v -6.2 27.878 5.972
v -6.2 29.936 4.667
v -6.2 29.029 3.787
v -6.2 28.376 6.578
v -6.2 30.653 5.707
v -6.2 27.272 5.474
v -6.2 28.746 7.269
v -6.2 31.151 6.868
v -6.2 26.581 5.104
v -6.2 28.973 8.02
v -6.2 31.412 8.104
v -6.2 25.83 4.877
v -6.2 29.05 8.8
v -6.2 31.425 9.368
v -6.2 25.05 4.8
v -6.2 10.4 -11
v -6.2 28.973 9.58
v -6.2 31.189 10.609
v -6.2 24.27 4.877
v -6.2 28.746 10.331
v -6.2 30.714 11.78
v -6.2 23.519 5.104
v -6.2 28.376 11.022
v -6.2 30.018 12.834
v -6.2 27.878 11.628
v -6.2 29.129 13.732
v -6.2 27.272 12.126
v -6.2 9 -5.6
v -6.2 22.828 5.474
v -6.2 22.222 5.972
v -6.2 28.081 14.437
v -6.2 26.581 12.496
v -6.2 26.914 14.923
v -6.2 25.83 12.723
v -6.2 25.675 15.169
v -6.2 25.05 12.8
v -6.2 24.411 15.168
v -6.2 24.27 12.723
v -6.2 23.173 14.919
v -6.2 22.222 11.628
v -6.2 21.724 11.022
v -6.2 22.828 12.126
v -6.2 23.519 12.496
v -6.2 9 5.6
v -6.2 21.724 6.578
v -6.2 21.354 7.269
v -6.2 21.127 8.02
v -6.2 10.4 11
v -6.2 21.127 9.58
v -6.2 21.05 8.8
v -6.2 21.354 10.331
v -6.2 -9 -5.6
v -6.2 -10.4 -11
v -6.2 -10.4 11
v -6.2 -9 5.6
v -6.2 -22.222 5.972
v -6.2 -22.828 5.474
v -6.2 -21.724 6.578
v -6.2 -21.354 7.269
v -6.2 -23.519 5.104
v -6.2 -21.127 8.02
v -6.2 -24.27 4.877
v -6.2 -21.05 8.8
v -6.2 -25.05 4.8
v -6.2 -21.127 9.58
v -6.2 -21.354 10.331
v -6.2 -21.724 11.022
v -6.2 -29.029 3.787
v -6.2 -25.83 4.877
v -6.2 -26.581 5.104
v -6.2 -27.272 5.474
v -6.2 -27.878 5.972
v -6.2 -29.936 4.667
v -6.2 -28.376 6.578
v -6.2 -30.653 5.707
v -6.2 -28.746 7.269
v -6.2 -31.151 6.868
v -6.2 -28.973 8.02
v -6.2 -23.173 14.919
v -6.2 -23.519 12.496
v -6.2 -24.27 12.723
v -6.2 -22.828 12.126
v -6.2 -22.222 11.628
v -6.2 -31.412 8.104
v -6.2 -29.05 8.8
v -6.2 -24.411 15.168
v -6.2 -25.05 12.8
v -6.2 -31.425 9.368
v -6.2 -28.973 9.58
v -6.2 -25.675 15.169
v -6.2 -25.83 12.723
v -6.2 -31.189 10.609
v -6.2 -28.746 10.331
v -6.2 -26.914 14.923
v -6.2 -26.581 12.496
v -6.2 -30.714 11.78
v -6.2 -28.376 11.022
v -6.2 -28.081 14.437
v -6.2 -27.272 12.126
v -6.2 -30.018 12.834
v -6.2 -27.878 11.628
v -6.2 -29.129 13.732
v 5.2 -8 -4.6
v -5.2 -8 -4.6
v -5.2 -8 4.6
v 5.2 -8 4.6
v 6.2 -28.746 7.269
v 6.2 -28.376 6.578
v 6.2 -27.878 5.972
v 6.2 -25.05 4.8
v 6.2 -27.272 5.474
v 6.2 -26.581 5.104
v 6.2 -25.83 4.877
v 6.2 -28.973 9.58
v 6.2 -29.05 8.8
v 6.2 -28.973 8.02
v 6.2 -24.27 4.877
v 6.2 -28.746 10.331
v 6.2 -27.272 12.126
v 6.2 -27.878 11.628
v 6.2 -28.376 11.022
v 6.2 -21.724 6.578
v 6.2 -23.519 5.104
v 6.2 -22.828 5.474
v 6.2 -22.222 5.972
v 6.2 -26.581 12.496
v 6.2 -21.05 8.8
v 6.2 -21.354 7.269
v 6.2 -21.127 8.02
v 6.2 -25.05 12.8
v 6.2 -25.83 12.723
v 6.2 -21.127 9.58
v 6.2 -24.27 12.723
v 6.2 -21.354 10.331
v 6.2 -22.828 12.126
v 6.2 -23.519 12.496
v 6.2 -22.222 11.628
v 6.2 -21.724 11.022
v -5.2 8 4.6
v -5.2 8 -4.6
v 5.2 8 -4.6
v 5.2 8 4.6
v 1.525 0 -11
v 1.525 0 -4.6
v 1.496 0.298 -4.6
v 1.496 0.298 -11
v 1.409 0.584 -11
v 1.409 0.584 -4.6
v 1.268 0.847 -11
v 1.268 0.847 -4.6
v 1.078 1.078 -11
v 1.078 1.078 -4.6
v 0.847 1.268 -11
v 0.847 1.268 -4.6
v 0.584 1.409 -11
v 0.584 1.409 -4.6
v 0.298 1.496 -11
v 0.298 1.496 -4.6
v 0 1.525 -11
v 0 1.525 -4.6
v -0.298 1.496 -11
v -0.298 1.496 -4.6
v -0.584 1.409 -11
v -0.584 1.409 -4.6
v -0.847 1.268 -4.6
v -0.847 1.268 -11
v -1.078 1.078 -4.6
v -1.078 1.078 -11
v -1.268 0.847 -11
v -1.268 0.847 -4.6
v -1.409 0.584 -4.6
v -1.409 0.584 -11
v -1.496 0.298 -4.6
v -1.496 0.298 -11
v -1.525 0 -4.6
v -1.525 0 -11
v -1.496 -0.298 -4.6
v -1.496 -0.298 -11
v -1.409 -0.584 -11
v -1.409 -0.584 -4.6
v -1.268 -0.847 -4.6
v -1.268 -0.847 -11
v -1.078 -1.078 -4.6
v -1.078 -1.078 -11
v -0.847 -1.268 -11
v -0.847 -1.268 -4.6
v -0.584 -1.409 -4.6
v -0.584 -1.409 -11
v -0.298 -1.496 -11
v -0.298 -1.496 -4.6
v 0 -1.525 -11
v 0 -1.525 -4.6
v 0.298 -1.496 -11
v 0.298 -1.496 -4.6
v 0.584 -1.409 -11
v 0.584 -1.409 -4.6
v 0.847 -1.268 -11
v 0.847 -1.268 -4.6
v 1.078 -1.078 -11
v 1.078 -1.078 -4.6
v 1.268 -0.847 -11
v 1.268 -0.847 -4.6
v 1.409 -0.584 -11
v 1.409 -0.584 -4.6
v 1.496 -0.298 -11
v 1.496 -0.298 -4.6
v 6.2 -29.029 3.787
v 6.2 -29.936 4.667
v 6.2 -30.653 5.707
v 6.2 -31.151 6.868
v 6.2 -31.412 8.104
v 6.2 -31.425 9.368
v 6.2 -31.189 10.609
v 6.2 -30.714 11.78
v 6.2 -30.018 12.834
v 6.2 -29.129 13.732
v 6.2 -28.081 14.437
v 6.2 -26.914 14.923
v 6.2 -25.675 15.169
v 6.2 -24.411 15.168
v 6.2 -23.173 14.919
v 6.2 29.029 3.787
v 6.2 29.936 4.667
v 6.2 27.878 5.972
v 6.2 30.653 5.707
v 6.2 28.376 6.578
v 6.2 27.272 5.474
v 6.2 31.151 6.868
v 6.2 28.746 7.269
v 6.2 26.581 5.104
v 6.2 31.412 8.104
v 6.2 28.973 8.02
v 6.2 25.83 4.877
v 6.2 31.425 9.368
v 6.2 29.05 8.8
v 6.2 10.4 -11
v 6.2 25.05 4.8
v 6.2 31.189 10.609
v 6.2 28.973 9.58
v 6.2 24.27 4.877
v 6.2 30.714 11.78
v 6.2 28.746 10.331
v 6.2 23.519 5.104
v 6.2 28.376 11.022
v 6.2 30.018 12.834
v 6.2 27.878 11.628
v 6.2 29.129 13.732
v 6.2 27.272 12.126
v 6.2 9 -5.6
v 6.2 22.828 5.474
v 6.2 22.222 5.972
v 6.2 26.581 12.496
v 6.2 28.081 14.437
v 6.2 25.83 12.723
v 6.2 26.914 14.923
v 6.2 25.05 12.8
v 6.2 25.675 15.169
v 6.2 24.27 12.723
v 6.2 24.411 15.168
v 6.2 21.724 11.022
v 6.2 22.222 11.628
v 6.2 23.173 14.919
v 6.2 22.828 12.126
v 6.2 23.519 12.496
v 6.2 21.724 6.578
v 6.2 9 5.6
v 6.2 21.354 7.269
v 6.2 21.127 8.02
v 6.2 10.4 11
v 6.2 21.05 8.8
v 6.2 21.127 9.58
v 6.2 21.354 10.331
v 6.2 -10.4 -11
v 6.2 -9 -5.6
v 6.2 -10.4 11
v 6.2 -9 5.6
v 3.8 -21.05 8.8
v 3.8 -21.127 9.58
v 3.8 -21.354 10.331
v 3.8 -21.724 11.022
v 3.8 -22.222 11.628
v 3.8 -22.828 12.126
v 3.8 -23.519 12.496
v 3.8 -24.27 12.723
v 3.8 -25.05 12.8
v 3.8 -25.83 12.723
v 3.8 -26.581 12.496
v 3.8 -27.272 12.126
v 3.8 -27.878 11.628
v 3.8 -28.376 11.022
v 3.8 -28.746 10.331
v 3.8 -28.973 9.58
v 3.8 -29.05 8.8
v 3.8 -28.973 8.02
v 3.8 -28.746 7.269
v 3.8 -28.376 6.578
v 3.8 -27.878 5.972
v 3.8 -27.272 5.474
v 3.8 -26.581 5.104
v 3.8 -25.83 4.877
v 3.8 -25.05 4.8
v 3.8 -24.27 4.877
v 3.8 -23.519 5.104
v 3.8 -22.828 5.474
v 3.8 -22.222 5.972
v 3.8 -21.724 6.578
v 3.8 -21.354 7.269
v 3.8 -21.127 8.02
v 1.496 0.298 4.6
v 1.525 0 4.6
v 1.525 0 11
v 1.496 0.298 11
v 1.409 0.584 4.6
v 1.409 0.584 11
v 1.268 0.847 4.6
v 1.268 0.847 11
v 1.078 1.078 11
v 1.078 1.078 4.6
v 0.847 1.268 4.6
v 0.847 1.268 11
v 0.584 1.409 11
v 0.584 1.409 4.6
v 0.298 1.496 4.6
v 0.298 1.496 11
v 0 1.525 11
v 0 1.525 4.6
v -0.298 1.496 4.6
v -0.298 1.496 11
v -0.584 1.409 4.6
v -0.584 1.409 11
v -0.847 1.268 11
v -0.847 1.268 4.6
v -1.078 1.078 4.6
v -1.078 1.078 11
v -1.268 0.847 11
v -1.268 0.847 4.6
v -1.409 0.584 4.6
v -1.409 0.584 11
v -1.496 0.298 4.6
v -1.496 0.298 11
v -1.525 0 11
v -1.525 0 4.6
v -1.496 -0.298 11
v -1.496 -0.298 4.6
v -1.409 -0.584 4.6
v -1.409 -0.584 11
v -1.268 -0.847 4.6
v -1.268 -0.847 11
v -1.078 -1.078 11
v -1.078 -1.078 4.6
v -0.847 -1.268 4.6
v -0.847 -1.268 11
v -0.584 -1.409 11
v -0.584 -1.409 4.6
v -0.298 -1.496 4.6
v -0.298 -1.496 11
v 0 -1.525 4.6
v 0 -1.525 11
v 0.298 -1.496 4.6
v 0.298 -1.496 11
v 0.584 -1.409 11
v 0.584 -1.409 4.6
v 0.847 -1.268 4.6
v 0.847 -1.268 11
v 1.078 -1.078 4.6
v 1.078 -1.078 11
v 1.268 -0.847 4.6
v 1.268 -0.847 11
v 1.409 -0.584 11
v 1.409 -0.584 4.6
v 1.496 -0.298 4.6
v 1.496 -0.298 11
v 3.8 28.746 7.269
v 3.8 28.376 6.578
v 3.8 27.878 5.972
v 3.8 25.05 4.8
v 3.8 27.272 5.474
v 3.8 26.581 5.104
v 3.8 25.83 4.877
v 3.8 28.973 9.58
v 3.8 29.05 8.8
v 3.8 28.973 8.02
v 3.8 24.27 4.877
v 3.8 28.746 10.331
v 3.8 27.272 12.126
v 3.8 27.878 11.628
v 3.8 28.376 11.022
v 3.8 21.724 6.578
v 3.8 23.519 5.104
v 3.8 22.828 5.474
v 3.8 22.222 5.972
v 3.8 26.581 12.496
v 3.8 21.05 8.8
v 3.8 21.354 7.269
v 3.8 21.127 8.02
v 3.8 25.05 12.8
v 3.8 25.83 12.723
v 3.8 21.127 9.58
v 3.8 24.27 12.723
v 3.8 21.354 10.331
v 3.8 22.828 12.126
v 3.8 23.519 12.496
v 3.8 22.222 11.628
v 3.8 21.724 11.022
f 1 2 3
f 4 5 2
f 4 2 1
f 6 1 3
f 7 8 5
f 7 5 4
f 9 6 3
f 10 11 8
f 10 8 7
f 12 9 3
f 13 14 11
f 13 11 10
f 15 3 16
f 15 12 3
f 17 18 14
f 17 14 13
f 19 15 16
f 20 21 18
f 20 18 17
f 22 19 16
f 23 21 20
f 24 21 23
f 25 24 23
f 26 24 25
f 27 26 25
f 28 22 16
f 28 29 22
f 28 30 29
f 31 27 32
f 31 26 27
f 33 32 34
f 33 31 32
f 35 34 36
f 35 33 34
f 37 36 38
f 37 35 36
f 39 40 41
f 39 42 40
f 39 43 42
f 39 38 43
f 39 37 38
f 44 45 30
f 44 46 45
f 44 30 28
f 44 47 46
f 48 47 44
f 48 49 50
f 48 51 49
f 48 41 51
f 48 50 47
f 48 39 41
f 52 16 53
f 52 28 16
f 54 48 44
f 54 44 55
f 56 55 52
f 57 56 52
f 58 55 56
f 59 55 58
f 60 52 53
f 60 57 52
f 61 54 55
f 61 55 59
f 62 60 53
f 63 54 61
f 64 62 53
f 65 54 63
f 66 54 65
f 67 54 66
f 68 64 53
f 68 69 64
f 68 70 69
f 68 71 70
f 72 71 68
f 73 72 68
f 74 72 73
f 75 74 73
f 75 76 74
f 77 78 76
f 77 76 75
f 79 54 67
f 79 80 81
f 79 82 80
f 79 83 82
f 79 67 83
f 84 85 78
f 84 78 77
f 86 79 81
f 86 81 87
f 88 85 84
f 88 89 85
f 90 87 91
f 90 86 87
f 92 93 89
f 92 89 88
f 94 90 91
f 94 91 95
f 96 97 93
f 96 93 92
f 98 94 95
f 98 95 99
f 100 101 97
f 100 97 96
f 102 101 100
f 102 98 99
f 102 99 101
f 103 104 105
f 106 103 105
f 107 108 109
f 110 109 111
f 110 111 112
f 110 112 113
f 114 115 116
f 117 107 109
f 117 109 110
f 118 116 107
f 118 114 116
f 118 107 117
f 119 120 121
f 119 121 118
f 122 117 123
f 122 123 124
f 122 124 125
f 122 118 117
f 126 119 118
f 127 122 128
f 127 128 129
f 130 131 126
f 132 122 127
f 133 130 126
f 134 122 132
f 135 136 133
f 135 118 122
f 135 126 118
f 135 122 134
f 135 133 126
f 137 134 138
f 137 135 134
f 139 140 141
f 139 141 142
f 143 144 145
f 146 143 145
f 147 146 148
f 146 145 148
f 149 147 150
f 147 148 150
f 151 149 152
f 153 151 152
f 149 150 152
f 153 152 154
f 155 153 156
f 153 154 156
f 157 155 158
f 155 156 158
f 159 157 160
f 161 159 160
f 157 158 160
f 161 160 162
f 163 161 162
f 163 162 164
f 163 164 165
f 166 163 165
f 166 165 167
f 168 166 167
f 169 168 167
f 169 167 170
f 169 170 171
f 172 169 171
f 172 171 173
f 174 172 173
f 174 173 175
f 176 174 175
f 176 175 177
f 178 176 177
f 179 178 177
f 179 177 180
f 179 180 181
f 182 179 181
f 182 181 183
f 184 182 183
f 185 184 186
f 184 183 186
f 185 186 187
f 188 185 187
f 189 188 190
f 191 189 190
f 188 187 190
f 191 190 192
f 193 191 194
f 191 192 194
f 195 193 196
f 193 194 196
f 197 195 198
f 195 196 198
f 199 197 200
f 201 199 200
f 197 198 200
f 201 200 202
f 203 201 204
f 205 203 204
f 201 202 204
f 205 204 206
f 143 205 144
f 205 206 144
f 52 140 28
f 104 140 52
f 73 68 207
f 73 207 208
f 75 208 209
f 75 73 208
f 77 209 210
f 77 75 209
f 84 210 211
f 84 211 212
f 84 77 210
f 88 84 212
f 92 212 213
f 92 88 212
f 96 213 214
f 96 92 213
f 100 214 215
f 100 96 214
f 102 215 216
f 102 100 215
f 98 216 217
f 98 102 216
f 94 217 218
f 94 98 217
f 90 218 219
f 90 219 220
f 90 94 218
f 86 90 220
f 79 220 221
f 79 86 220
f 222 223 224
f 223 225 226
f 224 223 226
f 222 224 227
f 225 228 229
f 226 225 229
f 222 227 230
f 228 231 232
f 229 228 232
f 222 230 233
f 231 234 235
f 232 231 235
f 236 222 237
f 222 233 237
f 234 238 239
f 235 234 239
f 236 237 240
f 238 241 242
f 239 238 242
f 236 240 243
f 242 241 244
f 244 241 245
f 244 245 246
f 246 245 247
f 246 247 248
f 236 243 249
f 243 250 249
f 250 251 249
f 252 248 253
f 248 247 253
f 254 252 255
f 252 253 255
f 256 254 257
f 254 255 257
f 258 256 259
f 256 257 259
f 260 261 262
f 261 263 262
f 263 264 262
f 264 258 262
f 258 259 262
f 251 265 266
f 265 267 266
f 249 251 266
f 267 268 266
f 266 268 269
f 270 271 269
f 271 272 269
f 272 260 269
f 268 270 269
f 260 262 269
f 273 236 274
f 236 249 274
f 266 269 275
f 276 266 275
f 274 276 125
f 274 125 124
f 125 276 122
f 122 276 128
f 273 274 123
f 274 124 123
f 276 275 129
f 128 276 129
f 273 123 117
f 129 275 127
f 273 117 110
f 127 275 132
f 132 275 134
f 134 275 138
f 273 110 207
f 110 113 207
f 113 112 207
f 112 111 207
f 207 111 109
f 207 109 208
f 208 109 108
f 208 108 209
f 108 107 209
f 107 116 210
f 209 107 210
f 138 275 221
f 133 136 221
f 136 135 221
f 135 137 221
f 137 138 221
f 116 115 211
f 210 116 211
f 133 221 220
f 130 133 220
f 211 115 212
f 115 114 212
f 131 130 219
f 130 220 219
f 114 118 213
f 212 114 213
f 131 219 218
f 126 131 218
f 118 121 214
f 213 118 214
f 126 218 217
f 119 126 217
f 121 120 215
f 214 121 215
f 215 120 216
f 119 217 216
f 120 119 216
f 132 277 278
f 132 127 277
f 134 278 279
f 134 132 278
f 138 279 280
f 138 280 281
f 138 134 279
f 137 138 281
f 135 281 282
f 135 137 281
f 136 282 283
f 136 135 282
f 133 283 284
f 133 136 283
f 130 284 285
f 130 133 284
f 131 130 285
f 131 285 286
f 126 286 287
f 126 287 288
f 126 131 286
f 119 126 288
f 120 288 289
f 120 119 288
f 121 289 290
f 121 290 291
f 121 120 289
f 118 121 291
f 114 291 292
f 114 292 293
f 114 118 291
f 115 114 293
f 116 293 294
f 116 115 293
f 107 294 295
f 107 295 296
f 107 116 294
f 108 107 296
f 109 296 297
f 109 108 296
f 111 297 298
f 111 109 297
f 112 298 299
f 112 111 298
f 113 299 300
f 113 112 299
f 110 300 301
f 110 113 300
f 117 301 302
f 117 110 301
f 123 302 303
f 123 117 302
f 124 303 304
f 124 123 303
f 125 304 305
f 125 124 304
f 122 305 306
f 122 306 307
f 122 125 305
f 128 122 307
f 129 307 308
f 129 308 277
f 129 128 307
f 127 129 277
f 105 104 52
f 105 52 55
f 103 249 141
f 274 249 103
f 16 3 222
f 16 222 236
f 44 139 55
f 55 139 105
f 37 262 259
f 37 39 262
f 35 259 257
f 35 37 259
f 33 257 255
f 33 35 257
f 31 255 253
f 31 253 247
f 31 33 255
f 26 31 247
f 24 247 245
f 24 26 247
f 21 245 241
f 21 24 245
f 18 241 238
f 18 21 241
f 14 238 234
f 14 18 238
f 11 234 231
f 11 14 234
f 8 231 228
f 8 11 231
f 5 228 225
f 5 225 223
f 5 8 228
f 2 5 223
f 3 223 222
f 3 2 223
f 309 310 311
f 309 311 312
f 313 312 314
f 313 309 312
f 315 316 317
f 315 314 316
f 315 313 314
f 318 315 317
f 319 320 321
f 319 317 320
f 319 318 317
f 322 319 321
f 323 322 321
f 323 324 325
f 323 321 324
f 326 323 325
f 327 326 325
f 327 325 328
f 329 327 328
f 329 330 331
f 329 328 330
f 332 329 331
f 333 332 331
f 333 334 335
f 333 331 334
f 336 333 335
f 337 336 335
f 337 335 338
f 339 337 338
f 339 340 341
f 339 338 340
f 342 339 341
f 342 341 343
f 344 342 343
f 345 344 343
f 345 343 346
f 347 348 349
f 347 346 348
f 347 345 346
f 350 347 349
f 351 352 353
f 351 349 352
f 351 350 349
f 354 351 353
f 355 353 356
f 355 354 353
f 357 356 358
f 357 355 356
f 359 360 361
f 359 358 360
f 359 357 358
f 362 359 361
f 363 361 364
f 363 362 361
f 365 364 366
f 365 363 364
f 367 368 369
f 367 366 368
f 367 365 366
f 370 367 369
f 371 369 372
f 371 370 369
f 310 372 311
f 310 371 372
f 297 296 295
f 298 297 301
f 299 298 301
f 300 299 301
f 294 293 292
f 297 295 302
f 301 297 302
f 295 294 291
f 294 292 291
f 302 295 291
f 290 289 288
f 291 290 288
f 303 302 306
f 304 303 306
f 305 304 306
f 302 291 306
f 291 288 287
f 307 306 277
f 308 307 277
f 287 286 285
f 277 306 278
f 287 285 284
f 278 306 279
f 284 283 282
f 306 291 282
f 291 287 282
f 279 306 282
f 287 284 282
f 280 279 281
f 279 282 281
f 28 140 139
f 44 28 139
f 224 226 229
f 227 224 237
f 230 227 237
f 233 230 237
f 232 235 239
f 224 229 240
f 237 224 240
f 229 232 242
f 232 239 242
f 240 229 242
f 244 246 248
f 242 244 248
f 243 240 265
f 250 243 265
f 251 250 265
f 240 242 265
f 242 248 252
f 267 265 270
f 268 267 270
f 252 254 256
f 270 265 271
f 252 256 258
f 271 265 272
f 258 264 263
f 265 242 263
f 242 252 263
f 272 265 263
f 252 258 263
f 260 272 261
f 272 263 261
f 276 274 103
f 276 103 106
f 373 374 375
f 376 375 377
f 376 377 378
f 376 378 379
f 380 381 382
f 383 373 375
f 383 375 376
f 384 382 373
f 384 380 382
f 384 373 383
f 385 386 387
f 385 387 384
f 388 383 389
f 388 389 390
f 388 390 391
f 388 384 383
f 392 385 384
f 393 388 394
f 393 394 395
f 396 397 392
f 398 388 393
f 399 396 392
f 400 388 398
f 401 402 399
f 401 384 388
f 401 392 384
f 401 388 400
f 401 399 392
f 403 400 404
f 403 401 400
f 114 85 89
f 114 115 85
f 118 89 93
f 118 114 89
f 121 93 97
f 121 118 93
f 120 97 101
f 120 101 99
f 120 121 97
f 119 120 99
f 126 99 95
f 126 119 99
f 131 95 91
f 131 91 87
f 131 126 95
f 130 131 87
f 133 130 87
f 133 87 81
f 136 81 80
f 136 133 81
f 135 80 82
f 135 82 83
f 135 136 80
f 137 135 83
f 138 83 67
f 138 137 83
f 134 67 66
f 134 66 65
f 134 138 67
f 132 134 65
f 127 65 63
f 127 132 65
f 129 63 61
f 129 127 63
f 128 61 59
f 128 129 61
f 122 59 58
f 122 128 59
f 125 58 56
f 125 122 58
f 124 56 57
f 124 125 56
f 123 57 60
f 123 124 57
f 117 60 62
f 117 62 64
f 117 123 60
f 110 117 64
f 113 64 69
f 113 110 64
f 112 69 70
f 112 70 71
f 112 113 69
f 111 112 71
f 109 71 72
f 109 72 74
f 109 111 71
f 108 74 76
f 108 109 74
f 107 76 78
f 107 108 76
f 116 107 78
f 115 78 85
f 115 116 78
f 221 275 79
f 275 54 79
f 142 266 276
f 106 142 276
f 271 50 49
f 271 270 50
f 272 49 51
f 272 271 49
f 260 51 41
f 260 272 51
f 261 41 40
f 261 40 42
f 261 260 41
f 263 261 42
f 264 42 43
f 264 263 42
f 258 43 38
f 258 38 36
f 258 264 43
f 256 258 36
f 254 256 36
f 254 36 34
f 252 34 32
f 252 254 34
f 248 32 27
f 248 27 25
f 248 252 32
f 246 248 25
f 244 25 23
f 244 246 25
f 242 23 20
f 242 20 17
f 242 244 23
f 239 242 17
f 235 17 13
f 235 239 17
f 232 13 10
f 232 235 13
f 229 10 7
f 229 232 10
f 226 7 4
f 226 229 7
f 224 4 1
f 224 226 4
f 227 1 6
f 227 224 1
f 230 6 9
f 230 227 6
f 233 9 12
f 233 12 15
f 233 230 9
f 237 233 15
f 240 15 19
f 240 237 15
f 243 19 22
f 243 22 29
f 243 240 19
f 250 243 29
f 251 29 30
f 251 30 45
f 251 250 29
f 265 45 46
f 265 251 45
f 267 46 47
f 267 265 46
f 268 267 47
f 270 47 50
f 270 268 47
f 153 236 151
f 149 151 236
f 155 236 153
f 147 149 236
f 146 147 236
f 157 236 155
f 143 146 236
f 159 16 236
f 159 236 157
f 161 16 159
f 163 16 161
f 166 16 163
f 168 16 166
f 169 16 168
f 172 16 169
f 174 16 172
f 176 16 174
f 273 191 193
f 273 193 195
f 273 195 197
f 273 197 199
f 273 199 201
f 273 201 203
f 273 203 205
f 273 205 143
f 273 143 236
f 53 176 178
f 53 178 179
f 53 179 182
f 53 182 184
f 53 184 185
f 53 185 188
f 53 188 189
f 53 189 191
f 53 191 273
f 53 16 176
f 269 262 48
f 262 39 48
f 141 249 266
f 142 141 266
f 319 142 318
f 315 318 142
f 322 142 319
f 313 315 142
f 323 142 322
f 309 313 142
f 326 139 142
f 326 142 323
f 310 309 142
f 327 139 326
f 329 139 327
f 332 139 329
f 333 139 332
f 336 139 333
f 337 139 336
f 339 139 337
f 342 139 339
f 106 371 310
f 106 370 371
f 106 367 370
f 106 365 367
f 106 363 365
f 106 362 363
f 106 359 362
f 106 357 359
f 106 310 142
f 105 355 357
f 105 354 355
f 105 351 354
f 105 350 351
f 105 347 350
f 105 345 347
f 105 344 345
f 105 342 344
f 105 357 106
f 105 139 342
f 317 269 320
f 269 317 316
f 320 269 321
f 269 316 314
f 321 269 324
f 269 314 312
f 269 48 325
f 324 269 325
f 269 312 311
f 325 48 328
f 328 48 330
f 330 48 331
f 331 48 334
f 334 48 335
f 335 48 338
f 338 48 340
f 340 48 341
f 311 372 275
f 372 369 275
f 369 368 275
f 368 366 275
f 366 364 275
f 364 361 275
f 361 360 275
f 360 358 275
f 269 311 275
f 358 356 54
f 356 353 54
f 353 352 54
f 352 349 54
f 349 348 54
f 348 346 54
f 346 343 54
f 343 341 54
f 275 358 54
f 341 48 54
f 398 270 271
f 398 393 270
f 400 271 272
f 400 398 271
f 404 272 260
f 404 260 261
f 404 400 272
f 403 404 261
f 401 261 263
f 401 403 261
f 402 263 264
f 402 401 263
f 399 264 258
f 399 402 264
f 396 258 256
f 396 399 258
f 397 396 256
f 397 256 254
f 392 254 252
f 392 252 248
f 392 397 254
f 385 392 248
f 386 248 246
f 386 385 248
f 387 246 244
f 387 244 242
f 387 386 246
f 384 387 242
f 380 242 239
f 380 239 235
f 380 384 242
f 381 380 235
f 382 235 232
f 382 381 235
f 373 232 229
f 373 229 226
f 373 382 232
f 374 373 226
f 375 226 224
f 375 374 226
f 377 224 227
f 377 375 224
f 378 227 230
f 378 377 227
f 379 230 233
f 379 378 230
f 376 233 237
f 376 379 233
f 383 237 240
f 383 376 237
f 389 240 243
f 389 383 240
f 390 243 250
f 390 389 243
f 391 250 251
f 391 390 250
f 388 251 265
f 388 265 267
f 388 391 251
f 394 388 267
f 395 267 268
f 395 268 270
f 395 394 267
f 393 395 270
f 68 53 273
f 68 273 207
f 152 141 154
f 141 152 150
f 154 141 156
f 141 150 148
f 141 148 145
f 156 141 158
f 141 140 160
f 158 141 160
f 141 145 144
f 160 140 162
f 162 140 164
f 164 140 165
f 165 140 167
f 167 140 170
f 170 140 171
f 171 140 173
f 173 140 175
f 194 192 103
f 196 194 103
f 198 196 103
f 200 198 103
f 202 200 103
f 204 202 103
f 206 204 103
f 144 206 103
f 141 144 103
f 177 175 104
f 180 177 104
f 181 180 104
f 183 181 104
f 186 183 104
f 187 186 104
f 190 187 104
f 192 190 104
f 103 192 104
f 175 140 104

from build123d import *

# Parameters (mm, degrees)
SKETCH019_R             = 4
SKETCH019_W             = 16
SKETCH019_H             = 9.2
PAD006_DEPTH            = 6.2
CHAMFER_SIZE            = 1
SKETCH_R                = 1.525
POCKET_DEPTH            = 11.001
POCKET_DEPTH_BACK       = -15.201
SKETCH020_R             = 4
PAD_DEPTH               = 1.2
SKETCH021_R             = 4
PAD007_DEPTH            = 1.2
BODY003_PLACEMENT_ANGLE = 180


with BuildPart() as rodholder:
    # Sketch019 → Pad006 (new body, symmetric)
    with BuildSketch(Plane(origin=(0, 0, 0), x_dir=(0, -1, 0), z_dir=(-1, 0, 0))):
        with BuildLine():
            ThreePointArc((-23.172921, 14.918544), (-30.714, 11.779782), (-29.028997, 3.787258))
            Line((-29.028997, 3.787258), (-10.4, -11))
            Line((-10.4, -11), (10.4, -11))
            Line((10.4, -11), (29.028997, 3.787258))
            ThreePointArc((29.028997, 3.787258), (30.714, 11.779782), (23.172921, 14.918544))
            Line((10.4, 11), (23.172921, 14.918544))
            Line((-10.4, 11), (10.4, 11))
            Line((-23.172921, 14.918544), (-10.4, 11))
        make_face()
        with Locations((25.05, 8.8)):
            Circle(SKETCH019_R, mode=Mode.SUBTRACT)
        with Locations((-25.05, 8.8)):
            Circle(SKETCH019_R, mode=Mode.SUBTRACT)
        Rectangle(SKETCH019_W, SKETCH019_H, mode=Mode.SUBTRACT)
    extrude(amount=PAD006_DEPTH, both=True)

    # Chamfer
    chamfer_edges = [rodholder.edges().sort_by_distance(p)[0] for p in [
        (-6.2, 0, 4.6),
        (-6.2, 8, 0),
        (-6.2, -8, 0),
        (-6.2, 0, -4.6),
        (6.2, 0, 4.6),
        (6.2, -8, 0),
        (6.2, 0, -4.6),
        (6.2, 8, 0),
    ]]
    chamfer(chamfer_edges, length=CHAMFER_SIZE)

    # Sketch → Pocket (cut, two sides)
    with BuildSketch(Plane.XY) as pocket_sk:
        Circle(SKETCH_R)
    extrude(amount=-POCKET_DEPTH, mode=Mode.SUBTRACT)
    extrude(pocket_sk.sketch, amount=-POCKET_DEPTH_BACK, mode=Mode.SUBTRACT)


with BuildPart() as rodcapleft:
    # Sketch020 → Pad (new body, symmetric)
    with BuildSketch(Plane.YZ):
        with Locations((-25.05, 8.8)):
            Circle(SKETCH020_R)
    extrude(amount=PAD_DEPTH, both=True)


with BuildPart() as rodcapleft_1:
    # Body placement: moved
    add(rodcapleft.part.moved(Location((5, 0, 0))))


with BuildPart() as rodcapright:
    # Sketch021 → Pad007 (new body, symmetric)
    with BuildSketch(Plane.YZ):
        with Locations((-25.05, 8.8)):
            Circle(SKETCH021_R)
    extrude(amount=PAD007_DEPTH, both=True)


with BuildPart() as rodcapright_1:
    # Body003 placement: moved
    add(rodcapright.part.moved(Location((5, 0, 0))).rotate(Axis((5, 0, 0), (0, 0, 1)), BODY003_PLACEMENT_ANGLE))


solid = Compound([rodholder.part, rodcapleft_1.part, rodcapright_1.part])
